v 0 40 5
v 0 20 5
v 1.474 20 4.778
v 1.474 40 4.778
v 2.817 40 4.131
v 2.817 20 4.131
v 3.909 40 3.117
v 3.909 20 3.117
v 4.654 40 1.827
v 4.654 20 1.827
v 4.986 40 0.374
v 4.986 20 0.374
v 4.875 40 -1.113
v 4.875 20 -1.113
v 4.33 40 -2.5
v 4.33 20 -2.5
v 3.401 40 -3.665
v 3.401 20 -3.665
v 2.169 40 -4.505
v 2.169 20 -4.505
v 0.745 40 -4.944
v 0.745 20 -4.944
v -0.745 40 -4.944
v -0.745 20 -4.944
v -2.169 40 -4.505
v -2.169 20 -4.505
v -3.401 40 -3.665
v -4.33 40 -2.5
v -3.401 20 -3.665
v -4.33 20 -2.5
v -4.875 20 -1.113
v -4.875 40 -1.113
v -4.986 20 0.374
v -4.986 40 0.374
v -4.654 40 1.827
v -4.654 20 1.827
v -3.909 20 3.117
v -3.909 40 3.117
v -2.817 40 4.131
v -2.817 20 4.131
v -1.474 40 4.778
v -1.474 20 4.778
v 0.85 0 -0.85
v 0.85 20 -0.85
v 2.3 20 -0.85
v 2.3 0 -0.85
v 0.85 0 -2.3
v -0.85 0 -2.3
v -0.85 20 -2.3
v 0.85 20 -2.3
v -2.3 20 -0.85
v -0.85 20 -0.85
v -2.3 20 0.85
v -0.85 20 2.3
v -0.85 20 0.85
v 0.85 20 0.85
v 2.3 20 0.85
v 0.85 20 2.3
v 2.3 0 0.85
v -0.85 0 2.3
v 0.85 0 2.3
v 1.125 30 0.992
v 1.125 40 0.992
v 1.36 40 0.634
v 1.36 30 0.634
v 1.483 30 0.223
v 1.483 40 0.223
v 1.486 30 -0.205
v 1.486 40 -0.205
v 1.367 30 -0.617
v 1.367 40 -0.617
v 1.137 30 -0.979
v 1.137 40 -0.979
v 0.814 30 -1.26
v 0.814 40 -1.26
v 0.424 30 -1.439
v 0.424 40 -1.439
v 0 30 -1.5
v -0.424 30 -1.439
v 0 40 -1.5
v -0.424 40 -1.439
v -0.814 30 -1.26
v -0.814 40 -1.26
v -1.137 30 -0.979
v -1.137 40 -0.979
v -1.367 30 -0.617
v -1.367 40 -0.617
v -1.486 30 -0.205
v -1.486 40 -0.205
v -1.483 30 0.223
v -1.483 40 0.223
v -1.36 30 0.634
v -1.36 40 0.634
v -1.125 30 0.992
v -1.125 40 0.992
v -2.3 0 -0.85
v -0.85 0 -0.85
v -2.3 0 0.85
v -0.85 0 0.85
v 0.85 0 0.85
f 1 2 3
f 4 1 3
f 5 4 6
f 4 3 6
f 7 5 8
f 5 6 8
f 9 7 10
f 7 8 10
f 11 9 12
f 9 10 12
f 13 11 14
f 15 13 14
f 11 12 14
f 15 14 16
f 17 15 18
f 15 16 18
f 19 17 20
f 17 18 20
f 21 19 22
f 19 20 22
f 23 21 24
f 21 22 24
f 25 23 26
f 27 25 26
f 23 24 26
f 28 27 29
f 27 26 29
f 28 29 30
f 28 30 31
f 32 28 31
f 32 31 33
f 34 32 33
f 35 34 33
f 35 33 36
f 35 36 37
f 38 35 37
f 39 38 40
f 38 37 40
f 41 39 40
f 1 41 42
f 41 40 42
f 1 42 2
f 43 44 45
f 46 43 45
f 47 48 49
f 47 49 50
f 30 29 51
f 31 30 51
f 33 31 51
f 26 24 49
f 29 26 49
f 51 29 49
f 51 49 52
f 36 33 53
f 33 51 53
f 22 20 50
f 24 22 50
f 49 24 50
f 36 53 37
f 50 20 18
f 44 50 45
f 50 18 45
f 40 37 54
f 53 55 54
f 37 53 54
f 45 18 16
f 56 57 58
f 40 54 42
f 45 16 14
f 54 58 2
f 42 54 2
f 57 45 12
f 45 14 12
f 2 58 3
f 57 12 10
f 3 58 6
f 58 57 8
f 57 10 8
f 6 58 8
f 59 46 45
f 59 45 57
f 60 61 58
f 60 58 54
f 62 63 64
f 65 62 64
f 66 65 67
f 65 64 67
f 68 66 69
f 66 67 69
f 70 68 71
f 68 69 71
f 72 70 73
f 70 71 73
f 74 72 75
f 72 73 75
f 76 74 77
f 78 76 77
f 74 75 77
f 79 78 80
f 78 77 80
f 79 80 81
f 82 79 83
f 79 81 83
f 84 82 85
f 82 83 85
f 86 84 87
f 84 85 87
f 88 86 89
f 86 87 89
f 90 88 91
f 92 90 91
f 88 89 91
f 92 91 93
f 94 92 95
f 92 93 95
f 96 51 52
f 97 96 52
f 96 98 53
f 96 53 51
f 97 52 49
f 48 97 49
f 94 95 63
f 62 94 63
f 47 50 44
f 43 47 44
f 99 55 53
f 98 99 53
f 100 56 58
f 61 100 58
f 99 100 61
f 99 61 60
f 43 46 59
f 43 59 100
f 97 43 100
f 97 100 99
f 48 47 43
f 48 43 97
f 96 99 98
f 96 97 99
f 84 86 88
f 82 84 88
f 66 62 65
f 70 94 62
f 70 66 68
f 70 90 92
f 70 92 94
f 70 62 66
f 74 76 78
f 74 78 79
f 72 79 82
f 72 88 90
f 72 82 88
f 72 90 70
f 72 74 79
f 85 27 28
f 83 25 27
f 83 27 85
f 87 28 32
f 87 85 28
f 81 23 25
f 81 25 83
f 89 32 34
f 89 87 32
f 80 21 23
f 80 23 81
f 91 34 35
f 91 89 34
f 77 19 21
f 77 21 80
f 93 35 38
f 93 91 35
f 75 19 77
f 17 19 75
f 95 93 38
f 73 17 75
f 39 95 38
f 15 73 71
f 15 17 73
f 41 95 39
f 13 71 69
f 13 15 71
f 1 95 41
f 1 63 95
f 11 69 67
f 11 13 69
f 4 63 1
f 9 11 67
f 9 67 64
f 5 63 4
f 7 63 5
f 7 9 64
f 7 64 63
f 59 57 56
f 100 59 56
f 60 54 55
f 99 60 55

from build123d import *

# Parameters (mm, degrees)
BOSS_EXTRUDE1_DEPTH = 20
SKETCH3_R           = 5
BOSS_EXTRUDE2_DEPTH = 20
CUT_EXTRUDE1_DEPTH  = 10


with BuildPart() as part:
    # Sketch2 → Boss-Extrude1 (new body)
    with BuildSketch(Plane(origin=(0, 0, 0), x_dir=(1, 0, 0), z_dir=(0, 1, 0))):
        Polygon((-0.85, 2.3), (0.85, 2.3), (0.85, 0.85), (2.3, 0.85), (2.3, -0.85), (0.85, -0.85), (0.85, -2.3), (-0.85, -2.3), (-0.85, -0.85), (-2.3, -0.85), (-2.3, 0.85), (-0.85, 0.85), align=None)
    extrude(amount=BOSS_EXTRUDE1_DEPTH)

    # Sketch3 → Boss-Extrude2 (add)
    with BuildSketch(Plane(origin=(0, 20, 0), x_dir=(1, 0, 0), z_dir=(0, 1, 0))):
        with Locations(Location((0, 0, 0), (0, 0, 270))):
            Circle(SKETCH3_R)
    extrude(amount=BOSS_EXTRUDE2_DEPTH)

    # Sketch4 → Cut-Extrude1 (cut)
    with BuildSketch(Plane(origin=(0, 40, 0), x_dir=(1, 0, 0), z_dir=(0, 1, 0))):
        with BuildLine():
            Line((-1.125, -0.992156742), (1.125, -0.992156742))
            ThreePointArc((1.125, -0.992156742), (0, 1.5), (-1.125, -0.992156742))
        make_face()
    extrude(amount=-CUT_EXTRUDE1_DEPTH, mode=Mode.SUBTRACT)


solid = part.part
